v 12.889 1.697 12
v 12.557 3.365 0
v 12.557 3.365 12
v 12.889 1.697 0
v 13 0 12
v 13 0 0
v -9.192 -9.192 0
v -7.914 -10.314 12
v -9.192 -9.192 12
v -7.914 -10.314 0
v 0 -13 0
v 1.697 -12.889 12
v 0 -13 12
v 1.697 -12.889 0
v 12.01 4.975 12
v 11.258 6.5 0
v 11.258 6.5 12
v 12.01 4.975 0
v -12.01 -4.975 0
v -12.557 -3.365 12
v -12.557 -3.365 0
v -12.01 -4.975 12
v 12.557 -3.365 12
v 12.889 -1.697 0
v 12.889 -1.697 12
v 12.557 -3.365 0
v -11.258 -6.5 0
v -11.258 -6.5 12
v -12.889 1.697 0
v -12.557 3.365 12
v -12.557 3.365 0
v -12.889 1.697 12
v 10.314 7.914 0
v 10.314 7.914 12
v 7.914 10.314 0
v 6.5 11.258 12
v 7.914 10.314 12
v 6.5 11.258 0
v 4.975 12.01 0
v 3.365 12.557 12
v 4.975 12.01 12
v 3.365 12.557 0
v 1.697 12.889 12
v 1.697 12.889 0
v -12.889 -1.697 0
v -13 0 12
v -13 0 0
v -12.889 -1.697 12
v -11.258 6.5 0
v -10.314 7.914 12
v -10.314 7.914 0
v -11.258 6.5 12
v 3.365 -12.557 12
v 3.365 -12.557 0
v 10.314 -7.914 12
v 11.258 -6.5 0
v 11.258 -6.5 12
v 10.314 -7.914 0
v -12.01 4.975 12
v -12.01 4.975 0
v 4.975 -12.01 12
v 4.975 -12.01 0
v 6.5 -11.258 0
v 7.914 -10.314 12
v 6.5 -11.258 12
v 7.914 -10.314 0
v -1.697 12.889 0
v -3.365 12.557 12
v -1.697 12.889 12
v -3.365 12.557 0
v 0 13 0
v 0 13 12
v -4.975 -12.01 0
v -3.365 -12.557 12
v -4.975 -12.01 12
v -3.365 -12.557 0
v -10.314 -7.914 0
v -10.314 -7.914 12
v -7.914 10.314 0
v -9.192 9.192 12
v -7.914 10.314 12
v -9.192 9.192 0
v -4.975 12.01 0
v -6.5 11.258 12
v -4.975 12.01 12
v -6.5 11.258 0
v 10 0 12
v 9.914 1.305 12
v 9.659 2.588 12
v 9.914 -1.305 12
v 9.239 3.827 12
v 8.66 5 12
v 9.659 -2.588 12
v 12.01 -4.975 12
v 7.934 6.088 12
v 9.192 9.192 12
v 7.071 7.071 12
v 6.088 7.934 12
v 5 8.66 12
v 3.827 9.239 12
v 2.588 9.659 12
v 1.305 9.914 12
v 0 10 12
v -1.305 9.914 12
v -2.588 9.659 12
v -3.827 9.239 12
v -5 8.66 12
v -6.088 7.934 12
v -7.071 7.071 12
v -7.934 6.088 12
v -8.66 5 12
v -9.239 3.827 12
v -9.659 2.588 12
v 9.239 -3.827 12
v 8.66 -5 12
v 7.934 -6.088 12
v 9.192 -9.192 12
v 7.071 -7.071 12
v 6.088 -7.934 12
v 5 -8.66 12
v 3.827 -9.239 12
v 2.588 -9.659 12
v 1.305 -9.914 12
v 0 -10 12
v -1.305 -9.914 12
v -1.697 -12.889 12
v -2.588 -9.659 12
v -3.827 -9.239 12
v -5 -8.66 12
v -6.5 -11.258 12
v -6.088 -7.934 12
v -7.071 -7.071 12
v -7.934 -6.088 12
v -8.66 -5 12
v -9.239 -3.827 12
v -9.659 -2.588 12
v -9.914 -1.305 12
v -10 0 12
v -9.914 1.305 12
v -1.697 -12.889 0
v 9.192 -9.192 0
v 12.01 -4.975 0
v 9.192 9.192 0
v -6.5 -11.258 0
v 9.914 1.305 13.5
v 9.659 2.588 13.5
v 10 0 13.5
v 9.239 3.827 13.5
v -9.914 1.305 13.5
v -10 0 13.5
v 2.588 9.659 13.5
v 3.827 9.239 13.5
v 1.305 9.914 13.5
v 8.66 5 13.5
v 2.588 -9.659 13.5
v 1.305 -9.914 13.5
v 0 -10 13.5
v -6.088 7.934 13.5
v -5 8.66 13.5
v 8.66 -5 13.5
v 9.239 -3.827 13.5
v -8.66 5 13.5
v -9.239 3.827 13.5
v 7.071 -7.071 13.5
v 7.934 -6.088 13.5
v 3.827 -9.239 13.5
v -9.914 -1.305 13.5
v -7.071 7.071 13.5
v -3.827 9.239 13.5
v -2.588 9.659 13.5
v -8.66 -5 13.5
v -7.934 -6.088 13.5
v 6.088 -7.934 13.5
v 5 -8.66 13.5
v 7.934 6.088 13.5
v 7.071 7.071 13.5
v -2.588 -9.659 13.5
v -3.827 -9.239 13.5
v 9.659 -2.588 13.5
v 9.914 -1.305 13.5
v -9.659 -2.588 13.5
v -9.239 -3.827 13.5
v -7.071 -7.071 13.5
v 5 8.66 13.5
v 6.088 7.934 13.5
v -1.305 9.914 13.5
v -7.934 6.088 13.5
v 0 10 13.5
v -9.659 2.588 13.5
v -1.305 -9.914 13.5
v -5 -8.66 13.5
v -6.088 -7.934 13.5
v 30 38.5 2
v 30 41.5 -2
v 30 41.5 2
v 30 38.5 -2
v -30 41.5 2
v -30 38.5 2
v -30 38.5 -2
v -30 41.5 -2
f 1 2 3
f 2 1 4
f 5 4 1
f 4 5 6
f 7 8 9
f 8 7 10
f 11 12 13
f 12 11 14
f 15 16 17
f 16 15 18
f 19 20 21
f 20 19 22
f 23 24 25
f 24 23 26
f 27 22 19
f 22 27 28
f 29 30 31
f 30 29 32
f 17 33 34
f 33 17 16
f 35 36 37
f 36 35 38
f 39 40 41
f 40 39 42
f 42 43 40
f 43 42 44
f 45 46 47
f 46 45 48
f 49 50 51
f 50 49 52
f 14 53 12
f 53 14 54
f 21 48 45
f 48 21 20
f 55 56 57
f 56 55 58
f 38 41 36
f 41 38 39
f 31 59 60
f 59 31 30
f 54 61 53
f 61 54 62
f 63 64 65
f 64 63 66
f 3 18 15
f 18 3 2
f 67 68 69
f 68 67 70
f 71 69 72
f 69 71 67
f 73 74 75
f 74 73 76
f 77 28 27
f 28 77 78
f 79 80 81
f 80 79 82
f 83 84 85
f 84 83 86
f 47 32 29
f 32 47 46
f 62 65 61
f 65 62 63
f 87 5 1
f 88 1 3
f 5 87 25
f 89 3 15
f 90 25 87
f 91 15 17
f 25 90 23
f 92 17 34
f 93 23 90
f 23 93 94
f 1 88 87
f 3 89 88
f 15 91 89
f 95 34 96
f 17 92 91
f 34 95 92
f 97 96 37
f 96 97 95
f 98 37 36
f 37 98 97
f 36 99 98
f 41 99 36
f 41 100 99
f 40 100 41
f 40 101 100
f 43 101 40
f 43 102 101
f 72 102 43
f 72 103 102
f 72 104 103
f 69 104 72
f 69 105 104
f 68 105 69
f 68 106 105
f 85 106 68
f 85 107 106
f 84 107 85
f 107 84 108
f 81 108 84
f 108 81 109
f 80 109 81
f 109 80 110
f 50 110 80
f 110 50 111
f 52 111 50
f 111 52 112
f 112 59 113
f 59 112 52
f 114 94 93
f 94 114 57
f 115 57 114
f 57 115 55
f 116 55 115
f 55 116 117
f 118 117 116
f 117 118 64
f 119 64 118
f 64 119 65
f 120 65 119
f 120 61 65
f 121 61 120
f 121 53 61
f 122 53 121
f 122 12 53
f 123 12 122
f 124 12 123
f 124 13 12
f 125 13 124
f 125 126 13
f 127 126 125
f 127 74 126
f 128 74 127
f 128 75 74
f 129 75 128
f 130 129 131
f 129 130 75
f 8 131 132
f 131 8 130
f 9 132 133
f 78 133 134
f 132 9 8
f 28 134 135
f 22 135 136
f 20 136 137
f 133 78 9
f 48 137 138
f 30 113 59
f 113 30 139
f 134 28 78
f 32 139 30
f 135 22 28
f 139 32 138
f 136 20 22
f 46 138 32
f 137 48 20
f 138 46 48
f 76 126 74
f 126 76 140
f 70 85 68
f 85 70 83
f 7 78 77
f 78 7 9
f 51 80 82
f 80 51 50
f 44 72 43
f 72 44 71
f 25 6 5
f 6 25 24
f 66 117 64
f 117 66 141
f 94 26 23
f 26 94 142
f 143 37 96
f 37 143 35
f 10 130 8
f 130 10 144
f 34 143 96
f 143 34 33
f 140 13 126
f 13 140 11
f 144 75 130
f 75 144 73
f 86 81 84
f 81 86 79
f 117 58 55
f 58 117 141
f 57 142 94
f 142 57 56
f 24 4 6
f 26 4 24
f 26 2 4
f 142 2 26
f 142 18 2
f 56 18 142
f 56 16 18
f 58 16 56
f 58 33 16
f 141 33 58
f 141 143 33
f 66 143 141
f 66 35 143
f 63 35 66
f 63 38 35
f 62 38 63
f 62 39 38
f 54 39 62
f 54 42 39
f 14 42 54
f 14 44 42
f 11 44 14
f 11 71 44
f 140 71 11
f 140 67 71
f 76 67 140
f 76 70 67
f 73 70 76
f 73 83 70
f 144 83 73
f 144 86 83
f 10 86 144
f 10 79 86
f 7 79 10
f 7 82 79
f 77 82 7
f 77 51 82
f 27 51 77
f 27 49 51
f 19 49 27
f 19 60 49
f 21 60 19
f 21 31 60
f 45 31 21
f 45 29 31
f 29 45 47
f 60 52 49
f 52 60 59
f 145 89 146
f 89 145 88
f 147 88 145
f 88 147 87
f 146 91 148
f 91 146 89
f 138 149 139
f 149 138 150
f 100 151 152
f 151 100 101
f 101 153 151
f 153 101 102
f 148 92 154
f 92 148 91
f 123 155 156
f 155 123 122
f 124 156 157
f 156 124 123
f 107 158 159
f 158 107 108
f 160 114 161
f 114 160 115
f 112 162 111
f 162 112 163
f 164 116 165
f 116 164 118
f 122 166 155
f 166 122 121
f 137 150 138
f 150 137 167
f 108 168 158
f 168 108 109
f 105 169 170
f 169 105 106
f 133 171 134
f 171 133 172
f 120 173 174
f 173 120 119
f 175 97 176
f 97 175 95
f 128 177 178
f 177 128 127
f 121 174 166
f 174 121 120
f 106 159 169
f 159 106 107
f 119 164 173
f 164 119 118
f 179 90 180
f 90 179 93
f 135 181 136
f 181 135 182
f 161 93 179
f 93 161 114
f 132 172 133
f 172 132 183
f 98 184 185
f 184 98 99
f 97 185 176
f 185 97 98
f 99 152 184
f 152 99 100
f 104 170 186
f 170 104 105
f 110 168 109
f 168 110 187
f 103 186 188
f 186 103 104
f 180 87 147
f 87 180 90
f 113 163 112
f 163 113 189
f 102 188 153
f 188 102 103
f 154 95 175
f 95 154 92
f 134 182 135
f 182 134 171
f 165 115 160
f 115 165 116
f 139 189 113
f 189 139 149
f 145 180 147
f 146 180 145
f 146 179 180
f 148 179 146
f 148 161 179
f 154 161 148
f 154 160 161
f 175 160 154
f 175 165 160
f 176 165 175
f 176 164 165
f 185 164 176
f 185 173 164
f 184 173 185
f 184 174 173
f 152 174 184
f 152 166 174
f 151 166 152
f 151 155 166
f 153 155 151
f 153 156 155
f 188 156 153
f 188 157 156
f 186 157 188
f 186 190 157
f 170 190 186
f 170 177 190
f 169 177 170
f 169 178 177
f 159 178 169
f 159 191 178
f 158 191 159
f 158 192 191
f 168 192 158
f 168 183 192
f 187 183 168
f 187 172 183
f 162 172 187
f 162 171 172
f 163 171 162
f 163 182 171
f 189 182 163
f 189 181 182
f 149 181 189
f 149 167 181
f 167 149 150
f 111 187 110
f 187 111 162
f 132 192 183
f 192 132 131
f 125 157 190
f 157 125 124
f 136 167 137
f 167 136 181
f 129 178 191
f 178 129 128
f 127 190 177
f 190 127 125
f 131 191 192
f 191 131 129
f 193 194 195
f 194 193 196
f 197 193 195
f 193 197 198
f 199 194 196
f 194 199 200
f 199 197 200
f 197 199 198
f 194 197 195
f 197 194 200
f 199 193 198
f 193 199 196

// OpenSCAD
/* =============================================================================
 * 智慧香爐 — 外購元件：超音波霧化模組 ＋ 罩內 LED 側光
 * =============================================================================
 * ★★ 外購品的示意模型，尺寸皆為估值、未實測 ★★（CLAUDE.md §7）
 * 霧化模組泡在爐盆的水裡；LED 貼在集煙罩內側，側向打光讓霧看得清楚。
 * ============================================================================= */

include <../params.scad>

// 原點：模組底面圓心（放在爐盆底）
module mist_module() {
    color("#d8dce0") cylinder(h = MIST_MOD_H, d = MIST_MOD_D);
    color("#9aa0a6") translate([0, 0, MIST_MOD_H])
        cylinder(h = 1.5, d = MIST_DISC_D);
}

// 原點：燈條中心，貼在罩內壁上
module hood_led() {
    color("#f2e6c8") cube([HOODLED_W, HOODLED_T, HOODLED_H], center = true);
}

// ── 單獨開檔時的預覽（被 use<> 引入時不執行）──
mist_module();
translate([0, 40, 0]) hood_led();
